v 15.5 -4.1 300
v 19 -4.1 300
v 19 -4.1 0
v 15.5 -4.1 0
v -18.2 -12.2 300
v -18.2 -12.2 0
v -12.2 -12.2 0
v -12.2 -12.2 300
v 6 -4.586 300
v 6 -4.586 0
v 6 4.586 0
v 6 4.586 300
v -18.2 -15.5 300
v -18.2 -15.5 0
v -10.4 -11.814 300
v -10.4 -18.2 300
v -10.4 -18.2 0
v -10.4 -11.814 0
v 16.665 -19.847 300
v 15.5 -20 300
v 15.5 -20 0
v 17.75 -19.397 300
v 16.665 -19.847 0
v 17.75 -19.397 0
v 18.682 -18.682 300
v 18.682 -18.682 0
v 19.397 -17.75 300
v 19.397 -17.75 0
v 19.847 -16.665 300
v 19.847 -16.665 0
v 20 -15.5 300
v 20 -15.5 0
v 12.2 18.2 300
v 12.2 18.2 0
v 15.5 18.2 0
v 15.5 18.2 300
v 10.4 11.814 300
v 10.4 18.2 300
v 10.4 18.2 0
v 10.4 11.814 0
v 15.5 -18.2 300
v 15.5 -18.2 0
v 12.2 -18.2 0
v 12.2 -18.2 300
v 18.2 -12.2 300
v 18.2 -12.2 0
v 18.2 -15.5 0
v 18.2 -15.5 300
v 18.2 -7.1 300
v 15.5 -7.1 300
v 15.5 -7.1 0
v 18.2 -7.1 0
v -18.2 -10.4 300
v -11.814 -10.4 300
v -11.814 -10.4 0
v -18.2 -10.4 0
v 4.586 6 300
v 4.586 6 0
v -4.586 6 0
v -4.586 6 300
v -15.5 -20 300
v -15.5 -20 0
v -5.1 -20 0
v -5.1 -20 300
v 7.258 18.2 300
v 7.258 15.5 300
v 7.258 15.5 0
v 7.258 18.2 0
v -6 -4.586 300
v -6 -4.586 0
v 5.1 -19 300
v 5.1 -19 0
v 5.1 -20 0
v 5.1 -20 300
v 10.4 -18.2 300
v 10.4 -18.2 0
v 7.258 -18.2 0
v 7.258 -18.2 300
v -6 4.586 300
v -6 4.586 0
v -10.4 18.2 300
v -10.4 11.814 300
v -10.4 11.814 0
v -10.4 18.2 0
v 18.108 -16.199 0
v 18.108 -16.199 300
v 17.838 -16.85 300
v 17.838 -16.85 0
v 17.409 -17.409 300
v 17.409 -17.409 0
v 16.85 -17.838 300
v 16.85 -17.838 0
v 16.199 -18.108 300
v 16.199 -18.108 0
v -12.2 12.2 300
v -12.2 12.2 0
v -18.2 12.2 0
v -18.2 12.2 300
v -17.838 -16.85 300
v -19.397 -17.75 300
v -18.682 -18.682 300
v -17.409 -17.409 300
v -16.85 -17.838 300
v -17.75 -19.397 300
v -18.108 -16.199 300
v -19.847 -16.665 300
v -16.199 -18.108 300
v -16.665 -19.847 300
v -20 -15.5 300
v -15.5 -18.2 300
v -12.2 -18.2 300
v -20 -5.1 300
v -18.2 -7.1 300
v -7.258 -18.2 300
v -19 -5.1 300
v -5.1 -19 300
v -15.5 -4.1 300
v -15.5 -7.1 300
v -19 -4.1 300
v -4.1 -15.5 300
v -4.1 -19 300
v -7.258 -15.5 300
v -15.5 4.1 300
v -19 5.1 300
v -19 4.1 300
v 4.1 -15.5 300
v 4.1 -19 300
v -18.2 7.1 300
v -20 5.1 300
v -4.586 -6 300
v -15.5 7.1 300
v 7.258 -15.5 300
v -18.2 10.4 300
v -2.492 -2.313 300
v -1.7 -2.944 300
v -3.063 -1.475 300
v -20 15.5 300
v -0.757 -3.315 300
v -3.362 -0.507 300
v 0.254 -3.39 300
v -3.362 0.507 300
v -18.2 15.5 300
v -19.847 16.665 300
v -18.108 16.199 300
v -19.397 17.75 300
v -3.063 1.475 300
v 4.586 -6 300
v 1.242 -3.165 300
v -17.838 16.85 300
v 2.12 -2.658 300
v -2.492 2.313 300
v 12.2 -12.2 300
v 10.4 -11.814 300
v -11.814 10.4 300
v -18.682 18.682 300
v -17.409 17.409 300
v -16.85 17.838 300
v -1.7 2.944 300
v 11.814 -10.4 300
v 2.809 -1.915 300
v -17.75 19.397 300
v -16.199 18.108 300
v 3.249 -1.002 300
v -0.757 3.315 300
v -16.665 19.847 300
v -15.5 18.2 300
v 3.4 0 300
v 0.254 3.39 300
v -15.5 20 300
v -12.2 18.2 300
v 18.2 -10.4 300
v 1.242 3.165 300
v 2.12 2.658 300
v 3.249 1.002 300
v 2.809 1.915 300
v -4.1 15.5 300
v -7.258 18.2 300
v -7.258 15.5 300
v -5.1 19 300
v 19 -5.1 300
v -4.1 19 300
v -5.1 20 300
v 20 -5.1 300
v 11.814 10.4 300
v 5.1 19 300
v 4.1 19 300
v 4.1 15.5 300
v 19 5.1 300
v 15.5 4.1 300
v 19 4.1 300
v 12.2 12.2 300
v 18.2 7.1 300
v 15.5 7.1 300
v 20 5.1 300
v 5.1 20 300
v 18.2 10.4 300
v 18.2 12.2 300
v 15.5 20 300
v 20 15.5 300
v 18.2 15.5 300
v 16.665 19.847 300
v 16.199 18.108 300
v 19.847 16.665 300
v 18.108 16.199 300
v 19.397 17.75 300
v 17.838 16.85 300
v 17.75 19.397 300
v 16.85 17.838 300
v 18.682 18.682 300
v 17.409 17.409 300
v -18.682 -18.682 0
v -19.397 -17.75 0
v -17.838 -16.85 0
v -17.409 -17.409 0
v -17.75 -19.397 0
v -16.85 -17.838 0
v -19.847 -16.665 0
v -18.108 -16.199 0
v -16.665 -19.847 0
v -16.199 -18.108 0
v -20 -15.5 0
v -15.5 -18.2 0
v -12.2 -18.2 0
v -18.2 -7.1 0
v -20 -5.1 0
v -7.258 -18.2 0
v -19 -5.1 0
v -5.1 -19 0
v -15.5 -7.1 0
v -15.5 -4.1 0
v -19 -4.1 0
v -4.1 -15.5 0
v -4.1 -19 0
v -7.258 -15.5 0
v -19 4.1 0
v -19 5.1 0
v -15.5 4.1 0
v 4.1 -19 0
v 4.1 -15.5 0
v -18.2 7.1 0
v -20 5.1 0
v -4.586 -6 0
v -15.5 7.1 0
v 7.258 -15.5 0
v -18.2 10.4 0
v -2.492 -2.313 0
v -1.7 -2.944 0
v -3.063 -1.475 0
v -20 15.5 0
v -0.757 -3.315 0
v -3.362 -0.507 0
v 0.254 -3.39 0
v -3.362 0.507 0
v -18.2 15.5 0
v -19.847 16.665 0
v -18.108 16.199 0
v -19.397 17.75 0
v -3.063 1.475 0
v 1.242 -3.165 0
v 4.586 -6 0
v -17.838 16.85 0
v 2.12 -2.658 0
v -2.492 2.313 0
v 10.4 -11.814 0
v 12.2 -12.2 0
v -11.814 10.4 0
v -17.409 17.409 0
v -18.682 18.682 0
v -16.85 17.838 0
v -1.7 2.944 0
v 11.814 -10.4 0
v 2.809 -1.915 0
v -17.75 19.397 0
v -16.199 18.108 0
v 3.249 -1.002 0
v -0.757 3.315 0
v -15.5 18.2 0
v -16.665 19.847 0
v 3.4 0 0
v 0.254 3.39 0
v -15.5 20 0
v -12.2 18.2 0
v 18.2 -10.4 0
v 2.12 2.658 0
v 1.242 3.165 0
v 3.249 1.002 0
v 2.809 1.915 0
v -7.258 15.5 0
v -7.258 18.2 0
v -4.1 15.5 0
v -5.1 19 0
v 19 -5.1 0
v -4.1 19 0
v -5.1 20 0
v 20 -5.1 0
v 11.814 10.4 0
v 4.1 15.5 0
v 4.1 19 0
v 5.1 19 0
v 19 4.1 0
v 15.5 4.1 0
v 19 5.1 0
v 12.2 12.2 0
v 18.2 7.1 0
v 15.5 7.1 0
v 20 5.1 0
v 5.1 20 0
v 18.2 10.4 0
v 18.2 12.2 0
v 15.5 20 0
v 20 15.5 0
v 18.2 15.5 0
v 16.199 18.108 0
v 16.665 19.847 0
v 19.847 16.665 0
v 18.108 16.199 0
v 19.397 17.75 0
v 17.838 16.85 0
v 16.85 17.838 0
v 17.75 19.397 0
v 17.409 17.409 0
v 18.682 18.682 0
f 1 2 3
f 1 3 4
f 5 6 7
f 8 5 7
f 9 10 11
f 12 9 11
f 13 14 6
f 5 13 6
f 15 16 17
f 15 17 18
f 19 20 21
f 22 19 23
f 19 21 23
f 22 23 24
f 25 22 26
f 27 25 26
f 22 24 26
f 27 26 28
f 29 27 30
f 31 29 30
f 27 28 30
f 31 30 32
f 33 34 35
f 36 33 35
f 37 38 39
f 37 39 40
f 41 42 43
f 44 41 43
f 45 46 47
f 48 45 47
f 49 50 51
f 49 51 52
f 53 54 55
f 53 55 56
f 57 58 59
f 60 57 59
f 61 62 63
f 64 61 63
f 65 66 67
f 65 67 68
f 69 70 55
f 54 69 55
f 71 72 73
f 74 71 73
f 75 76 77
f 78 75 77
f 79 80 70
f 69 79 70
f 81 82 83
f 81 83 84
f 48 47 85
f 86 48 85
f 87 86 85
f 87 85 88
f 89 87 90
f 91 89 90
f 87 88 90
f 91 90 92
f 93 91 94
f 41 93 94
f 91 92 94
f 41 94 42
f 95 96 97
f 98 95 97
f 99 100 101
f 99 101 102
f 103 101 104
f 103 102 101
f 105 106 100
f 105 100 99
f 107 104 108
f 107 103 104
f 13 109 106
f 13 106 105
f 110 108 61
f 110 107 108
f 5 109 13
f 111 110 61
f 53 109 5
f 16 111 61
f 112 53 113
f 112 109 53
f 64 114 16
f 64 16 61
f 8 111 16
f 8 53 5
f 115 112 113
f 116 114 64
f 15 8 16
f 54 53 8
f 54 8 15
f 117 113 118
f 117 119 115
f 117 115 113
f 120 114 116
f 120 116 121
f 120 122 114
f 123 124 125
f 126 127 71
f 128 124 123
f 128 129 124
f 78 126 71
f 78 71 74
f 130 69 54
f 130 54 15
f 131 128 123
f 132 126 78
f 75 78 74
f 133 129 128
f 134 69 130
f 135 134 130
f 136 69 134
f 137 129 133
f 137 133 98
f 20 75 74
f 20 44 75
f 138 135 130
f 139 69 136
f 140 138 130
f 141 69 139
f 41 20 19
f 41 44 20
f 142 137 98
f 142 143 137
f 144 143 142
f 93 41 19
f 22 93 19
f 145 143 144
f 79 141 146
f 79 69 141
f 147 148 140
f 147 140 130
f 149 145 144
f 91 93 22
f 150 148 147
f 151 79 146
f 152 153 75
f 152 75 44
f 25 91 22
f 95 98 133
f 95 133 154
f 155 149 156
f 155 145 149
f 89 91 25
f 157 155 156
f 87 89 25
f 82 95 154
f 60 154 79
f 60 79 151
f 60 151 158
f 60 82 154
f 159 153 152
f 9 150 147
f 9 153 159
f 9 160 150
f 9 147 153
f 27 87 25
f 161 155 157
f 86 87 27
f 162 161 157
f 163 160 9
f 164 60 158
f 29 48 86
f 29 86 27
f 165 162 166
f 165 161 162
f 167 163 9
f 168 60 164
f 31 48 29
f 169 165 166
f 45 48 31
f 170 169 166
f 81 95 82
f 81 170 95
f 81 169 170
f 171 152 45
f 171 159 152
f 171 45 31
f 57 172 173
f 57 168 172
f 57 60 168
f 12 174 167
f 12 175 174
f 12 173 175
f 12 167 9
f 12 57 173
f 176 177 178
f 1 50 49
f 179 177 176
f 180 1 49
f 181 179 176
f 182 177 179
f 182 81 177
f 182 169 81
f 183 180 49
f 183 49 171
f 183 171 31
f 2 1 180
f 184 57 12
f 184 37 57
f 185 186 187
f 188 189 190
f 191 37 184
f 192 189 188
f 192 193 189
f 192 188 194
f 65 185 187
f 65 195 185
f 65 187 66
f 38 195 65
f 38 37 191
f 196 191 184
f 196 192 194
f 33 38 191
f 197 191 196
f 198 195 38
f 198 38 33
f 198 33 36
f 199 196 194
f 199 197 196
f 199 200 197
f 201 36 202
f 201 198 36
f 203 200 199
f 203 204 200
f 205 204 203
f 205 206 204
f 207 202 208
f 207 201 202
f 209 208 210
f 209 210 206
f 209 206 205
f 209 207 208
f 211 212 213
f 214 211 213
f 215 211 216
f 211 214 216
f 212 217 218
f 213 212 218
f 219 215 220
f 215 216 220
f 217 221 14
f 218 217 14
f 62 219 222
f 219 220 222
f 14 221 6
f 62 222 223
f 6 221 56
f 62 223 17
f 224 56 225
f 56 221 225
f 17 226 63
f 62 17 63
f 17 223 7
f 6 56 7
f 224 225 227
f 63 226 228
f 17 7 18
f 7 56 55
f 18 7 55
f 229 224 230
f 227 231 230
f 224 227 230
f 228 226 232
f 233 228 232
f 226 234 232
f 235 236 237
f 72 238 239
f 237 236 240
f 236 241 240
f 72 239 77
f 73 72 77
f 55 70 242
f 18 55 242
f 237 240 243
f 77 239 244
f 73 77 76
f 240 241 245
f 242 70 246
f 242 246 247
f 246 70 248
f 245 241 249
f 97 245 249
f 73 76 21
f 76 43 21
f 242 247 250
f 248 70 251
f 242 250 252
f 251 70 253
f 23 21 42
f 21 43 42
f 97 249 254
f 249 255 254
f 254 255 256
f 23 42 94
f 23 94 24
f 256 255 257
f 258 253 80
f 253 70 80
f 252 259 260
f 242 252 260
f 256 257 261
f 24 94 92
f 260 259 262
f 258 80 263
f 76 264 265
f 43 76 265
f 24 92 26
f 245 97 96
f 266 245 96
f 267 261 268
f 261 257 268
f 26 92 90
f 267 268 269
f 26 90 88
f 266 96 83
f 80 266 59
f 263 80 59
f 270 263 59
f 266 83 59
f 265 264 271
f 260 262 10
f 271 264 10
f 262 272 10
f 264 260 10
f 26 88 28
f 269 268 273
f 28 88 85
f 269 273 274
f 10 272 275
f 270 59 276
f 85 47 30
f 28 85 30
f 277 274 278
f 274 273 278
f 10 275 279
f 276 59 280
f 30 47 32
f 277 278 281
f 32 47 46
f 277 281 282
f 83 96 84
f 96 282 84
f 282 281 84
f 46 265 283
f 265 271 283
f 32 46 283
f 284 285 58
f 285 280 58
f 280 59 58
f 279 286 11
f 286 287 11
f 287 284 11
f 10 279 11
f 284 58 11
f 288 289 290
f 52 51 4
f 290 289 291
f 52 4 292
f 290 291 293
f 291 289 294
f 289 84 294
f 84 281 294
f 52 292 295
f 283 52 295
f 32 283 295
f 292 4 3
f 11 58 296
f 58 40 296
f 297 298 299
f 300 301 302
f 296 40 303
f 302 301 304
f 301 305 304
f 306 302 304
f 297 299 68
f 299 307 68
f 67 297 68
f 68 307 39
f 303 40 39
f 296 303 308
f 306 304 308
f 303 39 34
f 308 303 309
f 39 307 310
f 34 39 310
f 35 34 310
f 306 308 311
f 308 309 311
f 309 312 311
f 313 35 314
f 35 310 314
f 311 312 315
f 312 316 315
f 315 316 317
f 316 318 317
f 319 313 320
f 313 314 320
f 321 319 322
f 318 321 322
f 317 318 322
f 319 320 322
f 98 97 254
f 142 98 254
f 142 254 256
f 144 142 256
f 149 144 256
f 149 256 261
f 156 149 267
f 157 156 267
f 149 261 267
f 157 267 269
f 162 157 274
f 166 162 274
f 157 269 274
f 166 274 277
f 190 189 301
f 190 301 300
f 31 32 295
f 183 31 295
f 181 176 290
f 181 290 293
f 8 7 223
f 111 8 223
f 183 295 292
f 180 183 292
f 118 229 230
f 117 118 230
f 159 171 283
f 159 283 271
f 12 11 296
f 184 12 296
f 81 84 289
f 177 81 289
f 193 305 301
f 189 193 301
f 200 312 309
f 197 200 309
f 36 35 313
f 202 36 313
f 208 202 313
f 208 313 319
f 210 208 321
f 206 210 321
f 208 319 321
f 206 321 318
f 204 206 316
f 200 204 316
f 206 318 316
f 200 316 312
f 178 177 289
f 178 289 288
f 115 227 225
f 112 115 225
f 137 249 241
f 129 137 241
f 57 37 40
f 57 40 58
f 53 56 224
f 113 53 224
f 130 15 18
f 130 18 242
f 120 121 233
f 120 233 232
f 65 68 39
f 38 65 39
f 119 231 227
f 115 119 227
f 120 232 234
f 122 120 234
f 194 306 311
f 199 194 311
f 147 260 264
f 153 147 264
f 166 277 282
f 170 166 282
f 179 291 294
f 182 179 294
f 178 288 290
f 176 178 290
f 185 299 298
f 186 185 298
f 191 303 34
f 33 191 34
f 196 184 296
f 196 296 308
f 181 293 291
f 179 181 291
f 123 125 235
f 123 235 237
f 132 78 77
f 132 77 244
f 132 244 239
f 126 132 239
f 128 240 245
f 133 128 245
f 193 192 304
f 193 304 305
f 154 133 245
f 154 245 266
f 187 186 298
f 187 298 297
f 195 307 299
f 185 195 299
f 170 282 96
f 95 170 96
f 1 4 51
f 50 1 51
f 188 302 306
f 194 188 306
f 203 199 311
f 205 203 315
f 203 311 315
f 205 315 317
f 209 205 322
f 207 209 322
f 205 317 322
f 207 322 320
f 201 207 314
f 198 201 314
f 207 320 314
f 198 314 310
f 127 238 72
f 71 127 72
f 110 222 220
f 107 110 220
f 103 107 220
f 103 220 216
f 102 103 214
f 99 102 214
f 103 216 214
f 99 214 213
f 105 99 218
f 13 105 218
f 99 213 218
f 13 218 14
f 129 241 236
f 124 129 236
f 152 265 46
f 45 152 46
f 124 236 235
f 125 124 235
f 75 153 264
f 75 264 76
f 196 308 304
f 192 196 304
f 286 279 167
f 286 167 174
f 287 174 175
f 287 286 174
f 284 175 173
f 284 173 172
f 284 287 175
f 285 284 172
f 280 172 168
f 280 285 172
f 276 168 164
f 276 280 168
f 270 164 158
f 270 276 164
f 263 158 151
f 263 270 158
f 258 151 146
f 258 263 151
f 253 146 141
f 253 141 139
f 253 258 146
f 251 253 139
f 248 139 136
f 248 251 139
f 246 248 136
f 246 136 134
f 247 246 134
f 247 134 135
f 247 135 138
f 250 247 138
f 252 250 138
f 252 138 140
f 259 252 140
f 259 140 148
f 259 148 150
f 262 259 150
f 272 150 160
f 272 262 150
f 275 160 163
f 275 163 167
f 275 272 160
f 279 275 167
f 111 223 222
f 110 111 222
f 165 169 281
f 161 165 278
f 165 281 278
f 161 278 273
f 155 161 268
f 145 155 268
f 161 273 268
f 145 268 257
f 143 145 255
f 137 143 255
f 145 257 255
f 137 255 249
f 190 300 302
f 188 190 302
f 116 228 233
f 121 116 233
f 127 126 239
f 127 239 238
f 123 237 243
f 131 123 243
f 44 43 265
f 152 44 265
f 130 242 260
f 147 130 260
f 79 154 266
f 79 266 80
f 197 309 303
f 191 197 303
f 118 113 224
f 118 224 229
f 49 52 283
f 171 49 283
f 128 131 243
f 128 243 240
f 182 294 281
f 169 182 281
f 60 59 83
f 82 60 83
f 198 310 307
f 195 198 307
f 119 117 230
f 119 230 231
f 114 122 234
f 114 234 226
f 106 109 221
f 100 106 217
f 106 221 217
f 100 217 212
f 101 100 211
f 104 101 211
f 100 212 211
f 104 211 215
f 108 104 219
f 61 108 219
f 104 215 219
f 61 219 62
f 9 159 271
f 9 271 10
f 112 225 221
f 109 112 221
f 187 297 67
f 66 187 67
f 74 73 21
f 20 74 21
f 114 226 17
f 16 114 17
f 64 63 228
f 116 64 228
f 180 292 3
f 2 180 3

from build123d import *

# Parameters (mm, degrees)
SKETCH3_R           = 3.4
BOSS_EXTRUDE1_DEPTH = 300


with BuildPart() as part:
    # Sketch3 → Boss-Extrude1 (new body)
    with BuildSketch(Plane.XY):
        with BuildLine():
            Line((-11.814213562, 10.4), (-6, 4.585786438))
            Line((-6, 4.585786438), (-6, -4.585786438))
            Line((-6, -4.585786438), (-11.814213562, -10.4))
            Line((-11.814213562, -10.4), (-18.2, -10.4))
            Line((-18.2, -10.4), (-18.2, -7.1))
            Line((-18.2, -7.1), (-15.5, -7.1))
            Line((-15.5, -7.1), (-15.5, -4.1))
            Line((-15.5, -4.1), (-19, -4.1))
            Line((-19, -4.1), (-19, -5.1))
            Line((-19, -5.1), (-20, -5.1))
            Line((-20, -5.1), (-20, -15.5))
            ThreePointArc((-20, -15.5), (-18.681980515, -18.681980515), (-15.5, -20))
            Line((-15.5, -20), (-5.1, -20))
            Line((-5.1, -20), (-5.1, -19))
            Line((-5.1, -19), (-4.1, -19))
            Line((-4.1, -19), (-4.1, -15.5))
            Line((-4.1, -15.5), (-7.258114106, -15.5))
            Line((-7.258114106, -15.5), (-7.258114106, -18.2))
            Line((-7.258114106, -18.2), (-10.4, -18.2))
            Line((-10.4, -18.2), (-10.4, -11.814213562))
            Line((-10.4, -11.814213562), (-4.585786438, -6))
            Line((-4.585786438, -6), (4.585786438, -6))
            Line((4.585786438, -6), (10.4, -11.814213562))
            Line((10.4, -11.814213562), (10.4, -18.2))
            Line((10.4, -18.2), (7.258114106, -18.2))
            Line((7.258114106, -18.2), (7.258114106, -15.5))
            Line((7.258114106, -15.5), (4.1, -15.5))
            Line((4.1, -15.5), (4.1, -19))
            Line((4.1, -19), (5.1, -19))
            Line((5.1, -19), (5.1, -20))
            Line((5.1, -20), (15.5, -20))
            ThreePointArc((15.5, -20), (18.681980515, -18.681980515), (20, -15.5))
            Line((20, -15.5), (20, -5.1))
            Line((20, -5.1), (19, -5.1))
            Line((19, -5.1), (19, -4.1))
            Line((19, -4.1), (15.5, -4.1))
            Line((15.5, -4.1), (15.5, -7.1))
            Line((15.5, -7.1), (18.2, -7.1))
            Line((18.2, -7.1), (18.2, -10.4))
            Line((18.2, -10.4), (11.814213562, -10.4))
            Line((11.814213562, -10.4), (6, -4.585786438))
            Line((6, -4.585786438), (6, 4.585786438))
            Line((6, 4.585786438), (11.814213562, 10.4))
            Line((11.814213562, 10.4), (18.2, 10.4))
            Line((18.2, 10.4), (18.2, 7.1))
            Line((18.2, 7.1), (15.5, 7.1))
            Line((15.5, 7.1), (15.5, 4.1))
            Line((15.5, 4.1), (19, 4.1))
            Line((19, 4.1), (19, 5.1))
            Line((19, 5.1), (20, 5.1))
            Line((20, 5.1), (20, 15.5))
            ThreePointArc((20, 15.5), (18.681980515, 18.681980515), (15.5, 20))
            Line((15.5, 20), (5.1, 20))
            Line((5.1, 20), (5.1, 19))
            Line((5.1, 19), (4.1, 19))
            Line((4.1, 19), (4.1, 15.5))
            Line((4.1, 15.5), (7.258114106, 15.5))
            Line((7.258114106, 15.5), (7.258114106, 18.2))
            Line((7.258114106, 18.2), (10.4, 18.2))
            Line((10.4, 18.2), (10.4, 11.814213562))
            Line((10.4, 11.814213562), (4.585786438, 6))
            Line((4.585786438, 6), (-4.585786438, 6))
            Line((-4.585786438, 6), (-10.4, 11.814213562))
            Line((-10.4, 11.814213562), (-10.4, 18.2))
            Line((-10.4, 18.2), (-7.258114106, 18.2))
            Line((-7.258114106, 18.2), (-7.258114106, 15.5))
            Line((-7.258114106, 15.5), (-4.1, 15.5))
            Line((-4.1, 15.5), (-4.1, 19))
            Line((-4.1, 19), (-5.1, 19))
            Line((-5.1, 19), (-5.1, 20))
            Line((-5.1, 20), (-15.5, 20))
            ThreePointArc((-15.5, 20), (-18.681980515, 18.681980515), (-20, 15.5))
            Line((-20, 15.5), (-20, 5.1))
            Line((-20, 5.1), (-19, 5.1))
            Line((-19, 5.1), (-19, 4.1))
            Line((-19, 4.1), (-15.5, 4.1))
            Line((-15.5, 4.1), (-15.5, 7.1))
            Line((-15.5, 7.1), (-18.2, 7.1))
            Line((-18.2, 7.1), (-18.2, 10.4))
            Line((-18.2, 10.4), (-11.814213562, 10.4))
        make_face()
        with BuildLine():
            Line((-18.2, -15.5), (-18.2, -12.2))
            Line((-18.2, -12.2), (-12.2, -12.2))
            Line((-12.2, -12.2), (-12.2, -18.2))
            Line((-12.2, -18.2), (-15.5, -18.2))
            ThreePointArc((-15.5, -18.2), (-17.409188309, -17.409188309), (-18.2, -15.5))
        make_face(mode=Mode.SUBTRACT)
        Circle(SKETCH3_R, mode=Mode.SUBTRACT)
        with BuildLine():
            Line((-18.2, 12.2), (-18.2, 15.5))
            ThreePointArc((-18.2, 15.5), (-17.409188309, 17.409188309), (-15.5, 18.2))
            Line((-15.5, 18.2), (-12.2, 18.2))
            Line((-12.2, 18.2), (-12.2, 12.2))
            Line((-12.2, 12.2), (-18.2, 12.2))
        make_face(mode=Mode.SUBTRACT)
        with BuildLine():
            Line((18.2, 15.5), (18.2, 12.2))
            Line((18.2, 12.2), (12.2, 12.2))
            Line((12.2, 12.2), (12.2, 18.2))
            Line((12.2, 18.2), (15.5, 18.2))
            ThreePointArc((15.5, 18.2), (17.409188309, 17.409188309), (18.2, 15.5))
        make_face(mode=Mode.SUBTRACT)
        with BuildLine():
            Line((12.2, -18.2), (12.2, -12.2))
            Line((12.2, -12.2), (18.2, -12.2))
            Line((18.2, -12.2), (18.2, -15.5))
            ThreePointArc((18.2, -15.5), (17.409188309, -17.409188309), (15.5, -18.2))
            Line((15.5, -18.2), (12.2, -18.2))
        make_face(mode=Mode.SUBTRACT)
    extrude(amount=BOSS_EXTRUDE1_DEPTH)


solid = part.part
